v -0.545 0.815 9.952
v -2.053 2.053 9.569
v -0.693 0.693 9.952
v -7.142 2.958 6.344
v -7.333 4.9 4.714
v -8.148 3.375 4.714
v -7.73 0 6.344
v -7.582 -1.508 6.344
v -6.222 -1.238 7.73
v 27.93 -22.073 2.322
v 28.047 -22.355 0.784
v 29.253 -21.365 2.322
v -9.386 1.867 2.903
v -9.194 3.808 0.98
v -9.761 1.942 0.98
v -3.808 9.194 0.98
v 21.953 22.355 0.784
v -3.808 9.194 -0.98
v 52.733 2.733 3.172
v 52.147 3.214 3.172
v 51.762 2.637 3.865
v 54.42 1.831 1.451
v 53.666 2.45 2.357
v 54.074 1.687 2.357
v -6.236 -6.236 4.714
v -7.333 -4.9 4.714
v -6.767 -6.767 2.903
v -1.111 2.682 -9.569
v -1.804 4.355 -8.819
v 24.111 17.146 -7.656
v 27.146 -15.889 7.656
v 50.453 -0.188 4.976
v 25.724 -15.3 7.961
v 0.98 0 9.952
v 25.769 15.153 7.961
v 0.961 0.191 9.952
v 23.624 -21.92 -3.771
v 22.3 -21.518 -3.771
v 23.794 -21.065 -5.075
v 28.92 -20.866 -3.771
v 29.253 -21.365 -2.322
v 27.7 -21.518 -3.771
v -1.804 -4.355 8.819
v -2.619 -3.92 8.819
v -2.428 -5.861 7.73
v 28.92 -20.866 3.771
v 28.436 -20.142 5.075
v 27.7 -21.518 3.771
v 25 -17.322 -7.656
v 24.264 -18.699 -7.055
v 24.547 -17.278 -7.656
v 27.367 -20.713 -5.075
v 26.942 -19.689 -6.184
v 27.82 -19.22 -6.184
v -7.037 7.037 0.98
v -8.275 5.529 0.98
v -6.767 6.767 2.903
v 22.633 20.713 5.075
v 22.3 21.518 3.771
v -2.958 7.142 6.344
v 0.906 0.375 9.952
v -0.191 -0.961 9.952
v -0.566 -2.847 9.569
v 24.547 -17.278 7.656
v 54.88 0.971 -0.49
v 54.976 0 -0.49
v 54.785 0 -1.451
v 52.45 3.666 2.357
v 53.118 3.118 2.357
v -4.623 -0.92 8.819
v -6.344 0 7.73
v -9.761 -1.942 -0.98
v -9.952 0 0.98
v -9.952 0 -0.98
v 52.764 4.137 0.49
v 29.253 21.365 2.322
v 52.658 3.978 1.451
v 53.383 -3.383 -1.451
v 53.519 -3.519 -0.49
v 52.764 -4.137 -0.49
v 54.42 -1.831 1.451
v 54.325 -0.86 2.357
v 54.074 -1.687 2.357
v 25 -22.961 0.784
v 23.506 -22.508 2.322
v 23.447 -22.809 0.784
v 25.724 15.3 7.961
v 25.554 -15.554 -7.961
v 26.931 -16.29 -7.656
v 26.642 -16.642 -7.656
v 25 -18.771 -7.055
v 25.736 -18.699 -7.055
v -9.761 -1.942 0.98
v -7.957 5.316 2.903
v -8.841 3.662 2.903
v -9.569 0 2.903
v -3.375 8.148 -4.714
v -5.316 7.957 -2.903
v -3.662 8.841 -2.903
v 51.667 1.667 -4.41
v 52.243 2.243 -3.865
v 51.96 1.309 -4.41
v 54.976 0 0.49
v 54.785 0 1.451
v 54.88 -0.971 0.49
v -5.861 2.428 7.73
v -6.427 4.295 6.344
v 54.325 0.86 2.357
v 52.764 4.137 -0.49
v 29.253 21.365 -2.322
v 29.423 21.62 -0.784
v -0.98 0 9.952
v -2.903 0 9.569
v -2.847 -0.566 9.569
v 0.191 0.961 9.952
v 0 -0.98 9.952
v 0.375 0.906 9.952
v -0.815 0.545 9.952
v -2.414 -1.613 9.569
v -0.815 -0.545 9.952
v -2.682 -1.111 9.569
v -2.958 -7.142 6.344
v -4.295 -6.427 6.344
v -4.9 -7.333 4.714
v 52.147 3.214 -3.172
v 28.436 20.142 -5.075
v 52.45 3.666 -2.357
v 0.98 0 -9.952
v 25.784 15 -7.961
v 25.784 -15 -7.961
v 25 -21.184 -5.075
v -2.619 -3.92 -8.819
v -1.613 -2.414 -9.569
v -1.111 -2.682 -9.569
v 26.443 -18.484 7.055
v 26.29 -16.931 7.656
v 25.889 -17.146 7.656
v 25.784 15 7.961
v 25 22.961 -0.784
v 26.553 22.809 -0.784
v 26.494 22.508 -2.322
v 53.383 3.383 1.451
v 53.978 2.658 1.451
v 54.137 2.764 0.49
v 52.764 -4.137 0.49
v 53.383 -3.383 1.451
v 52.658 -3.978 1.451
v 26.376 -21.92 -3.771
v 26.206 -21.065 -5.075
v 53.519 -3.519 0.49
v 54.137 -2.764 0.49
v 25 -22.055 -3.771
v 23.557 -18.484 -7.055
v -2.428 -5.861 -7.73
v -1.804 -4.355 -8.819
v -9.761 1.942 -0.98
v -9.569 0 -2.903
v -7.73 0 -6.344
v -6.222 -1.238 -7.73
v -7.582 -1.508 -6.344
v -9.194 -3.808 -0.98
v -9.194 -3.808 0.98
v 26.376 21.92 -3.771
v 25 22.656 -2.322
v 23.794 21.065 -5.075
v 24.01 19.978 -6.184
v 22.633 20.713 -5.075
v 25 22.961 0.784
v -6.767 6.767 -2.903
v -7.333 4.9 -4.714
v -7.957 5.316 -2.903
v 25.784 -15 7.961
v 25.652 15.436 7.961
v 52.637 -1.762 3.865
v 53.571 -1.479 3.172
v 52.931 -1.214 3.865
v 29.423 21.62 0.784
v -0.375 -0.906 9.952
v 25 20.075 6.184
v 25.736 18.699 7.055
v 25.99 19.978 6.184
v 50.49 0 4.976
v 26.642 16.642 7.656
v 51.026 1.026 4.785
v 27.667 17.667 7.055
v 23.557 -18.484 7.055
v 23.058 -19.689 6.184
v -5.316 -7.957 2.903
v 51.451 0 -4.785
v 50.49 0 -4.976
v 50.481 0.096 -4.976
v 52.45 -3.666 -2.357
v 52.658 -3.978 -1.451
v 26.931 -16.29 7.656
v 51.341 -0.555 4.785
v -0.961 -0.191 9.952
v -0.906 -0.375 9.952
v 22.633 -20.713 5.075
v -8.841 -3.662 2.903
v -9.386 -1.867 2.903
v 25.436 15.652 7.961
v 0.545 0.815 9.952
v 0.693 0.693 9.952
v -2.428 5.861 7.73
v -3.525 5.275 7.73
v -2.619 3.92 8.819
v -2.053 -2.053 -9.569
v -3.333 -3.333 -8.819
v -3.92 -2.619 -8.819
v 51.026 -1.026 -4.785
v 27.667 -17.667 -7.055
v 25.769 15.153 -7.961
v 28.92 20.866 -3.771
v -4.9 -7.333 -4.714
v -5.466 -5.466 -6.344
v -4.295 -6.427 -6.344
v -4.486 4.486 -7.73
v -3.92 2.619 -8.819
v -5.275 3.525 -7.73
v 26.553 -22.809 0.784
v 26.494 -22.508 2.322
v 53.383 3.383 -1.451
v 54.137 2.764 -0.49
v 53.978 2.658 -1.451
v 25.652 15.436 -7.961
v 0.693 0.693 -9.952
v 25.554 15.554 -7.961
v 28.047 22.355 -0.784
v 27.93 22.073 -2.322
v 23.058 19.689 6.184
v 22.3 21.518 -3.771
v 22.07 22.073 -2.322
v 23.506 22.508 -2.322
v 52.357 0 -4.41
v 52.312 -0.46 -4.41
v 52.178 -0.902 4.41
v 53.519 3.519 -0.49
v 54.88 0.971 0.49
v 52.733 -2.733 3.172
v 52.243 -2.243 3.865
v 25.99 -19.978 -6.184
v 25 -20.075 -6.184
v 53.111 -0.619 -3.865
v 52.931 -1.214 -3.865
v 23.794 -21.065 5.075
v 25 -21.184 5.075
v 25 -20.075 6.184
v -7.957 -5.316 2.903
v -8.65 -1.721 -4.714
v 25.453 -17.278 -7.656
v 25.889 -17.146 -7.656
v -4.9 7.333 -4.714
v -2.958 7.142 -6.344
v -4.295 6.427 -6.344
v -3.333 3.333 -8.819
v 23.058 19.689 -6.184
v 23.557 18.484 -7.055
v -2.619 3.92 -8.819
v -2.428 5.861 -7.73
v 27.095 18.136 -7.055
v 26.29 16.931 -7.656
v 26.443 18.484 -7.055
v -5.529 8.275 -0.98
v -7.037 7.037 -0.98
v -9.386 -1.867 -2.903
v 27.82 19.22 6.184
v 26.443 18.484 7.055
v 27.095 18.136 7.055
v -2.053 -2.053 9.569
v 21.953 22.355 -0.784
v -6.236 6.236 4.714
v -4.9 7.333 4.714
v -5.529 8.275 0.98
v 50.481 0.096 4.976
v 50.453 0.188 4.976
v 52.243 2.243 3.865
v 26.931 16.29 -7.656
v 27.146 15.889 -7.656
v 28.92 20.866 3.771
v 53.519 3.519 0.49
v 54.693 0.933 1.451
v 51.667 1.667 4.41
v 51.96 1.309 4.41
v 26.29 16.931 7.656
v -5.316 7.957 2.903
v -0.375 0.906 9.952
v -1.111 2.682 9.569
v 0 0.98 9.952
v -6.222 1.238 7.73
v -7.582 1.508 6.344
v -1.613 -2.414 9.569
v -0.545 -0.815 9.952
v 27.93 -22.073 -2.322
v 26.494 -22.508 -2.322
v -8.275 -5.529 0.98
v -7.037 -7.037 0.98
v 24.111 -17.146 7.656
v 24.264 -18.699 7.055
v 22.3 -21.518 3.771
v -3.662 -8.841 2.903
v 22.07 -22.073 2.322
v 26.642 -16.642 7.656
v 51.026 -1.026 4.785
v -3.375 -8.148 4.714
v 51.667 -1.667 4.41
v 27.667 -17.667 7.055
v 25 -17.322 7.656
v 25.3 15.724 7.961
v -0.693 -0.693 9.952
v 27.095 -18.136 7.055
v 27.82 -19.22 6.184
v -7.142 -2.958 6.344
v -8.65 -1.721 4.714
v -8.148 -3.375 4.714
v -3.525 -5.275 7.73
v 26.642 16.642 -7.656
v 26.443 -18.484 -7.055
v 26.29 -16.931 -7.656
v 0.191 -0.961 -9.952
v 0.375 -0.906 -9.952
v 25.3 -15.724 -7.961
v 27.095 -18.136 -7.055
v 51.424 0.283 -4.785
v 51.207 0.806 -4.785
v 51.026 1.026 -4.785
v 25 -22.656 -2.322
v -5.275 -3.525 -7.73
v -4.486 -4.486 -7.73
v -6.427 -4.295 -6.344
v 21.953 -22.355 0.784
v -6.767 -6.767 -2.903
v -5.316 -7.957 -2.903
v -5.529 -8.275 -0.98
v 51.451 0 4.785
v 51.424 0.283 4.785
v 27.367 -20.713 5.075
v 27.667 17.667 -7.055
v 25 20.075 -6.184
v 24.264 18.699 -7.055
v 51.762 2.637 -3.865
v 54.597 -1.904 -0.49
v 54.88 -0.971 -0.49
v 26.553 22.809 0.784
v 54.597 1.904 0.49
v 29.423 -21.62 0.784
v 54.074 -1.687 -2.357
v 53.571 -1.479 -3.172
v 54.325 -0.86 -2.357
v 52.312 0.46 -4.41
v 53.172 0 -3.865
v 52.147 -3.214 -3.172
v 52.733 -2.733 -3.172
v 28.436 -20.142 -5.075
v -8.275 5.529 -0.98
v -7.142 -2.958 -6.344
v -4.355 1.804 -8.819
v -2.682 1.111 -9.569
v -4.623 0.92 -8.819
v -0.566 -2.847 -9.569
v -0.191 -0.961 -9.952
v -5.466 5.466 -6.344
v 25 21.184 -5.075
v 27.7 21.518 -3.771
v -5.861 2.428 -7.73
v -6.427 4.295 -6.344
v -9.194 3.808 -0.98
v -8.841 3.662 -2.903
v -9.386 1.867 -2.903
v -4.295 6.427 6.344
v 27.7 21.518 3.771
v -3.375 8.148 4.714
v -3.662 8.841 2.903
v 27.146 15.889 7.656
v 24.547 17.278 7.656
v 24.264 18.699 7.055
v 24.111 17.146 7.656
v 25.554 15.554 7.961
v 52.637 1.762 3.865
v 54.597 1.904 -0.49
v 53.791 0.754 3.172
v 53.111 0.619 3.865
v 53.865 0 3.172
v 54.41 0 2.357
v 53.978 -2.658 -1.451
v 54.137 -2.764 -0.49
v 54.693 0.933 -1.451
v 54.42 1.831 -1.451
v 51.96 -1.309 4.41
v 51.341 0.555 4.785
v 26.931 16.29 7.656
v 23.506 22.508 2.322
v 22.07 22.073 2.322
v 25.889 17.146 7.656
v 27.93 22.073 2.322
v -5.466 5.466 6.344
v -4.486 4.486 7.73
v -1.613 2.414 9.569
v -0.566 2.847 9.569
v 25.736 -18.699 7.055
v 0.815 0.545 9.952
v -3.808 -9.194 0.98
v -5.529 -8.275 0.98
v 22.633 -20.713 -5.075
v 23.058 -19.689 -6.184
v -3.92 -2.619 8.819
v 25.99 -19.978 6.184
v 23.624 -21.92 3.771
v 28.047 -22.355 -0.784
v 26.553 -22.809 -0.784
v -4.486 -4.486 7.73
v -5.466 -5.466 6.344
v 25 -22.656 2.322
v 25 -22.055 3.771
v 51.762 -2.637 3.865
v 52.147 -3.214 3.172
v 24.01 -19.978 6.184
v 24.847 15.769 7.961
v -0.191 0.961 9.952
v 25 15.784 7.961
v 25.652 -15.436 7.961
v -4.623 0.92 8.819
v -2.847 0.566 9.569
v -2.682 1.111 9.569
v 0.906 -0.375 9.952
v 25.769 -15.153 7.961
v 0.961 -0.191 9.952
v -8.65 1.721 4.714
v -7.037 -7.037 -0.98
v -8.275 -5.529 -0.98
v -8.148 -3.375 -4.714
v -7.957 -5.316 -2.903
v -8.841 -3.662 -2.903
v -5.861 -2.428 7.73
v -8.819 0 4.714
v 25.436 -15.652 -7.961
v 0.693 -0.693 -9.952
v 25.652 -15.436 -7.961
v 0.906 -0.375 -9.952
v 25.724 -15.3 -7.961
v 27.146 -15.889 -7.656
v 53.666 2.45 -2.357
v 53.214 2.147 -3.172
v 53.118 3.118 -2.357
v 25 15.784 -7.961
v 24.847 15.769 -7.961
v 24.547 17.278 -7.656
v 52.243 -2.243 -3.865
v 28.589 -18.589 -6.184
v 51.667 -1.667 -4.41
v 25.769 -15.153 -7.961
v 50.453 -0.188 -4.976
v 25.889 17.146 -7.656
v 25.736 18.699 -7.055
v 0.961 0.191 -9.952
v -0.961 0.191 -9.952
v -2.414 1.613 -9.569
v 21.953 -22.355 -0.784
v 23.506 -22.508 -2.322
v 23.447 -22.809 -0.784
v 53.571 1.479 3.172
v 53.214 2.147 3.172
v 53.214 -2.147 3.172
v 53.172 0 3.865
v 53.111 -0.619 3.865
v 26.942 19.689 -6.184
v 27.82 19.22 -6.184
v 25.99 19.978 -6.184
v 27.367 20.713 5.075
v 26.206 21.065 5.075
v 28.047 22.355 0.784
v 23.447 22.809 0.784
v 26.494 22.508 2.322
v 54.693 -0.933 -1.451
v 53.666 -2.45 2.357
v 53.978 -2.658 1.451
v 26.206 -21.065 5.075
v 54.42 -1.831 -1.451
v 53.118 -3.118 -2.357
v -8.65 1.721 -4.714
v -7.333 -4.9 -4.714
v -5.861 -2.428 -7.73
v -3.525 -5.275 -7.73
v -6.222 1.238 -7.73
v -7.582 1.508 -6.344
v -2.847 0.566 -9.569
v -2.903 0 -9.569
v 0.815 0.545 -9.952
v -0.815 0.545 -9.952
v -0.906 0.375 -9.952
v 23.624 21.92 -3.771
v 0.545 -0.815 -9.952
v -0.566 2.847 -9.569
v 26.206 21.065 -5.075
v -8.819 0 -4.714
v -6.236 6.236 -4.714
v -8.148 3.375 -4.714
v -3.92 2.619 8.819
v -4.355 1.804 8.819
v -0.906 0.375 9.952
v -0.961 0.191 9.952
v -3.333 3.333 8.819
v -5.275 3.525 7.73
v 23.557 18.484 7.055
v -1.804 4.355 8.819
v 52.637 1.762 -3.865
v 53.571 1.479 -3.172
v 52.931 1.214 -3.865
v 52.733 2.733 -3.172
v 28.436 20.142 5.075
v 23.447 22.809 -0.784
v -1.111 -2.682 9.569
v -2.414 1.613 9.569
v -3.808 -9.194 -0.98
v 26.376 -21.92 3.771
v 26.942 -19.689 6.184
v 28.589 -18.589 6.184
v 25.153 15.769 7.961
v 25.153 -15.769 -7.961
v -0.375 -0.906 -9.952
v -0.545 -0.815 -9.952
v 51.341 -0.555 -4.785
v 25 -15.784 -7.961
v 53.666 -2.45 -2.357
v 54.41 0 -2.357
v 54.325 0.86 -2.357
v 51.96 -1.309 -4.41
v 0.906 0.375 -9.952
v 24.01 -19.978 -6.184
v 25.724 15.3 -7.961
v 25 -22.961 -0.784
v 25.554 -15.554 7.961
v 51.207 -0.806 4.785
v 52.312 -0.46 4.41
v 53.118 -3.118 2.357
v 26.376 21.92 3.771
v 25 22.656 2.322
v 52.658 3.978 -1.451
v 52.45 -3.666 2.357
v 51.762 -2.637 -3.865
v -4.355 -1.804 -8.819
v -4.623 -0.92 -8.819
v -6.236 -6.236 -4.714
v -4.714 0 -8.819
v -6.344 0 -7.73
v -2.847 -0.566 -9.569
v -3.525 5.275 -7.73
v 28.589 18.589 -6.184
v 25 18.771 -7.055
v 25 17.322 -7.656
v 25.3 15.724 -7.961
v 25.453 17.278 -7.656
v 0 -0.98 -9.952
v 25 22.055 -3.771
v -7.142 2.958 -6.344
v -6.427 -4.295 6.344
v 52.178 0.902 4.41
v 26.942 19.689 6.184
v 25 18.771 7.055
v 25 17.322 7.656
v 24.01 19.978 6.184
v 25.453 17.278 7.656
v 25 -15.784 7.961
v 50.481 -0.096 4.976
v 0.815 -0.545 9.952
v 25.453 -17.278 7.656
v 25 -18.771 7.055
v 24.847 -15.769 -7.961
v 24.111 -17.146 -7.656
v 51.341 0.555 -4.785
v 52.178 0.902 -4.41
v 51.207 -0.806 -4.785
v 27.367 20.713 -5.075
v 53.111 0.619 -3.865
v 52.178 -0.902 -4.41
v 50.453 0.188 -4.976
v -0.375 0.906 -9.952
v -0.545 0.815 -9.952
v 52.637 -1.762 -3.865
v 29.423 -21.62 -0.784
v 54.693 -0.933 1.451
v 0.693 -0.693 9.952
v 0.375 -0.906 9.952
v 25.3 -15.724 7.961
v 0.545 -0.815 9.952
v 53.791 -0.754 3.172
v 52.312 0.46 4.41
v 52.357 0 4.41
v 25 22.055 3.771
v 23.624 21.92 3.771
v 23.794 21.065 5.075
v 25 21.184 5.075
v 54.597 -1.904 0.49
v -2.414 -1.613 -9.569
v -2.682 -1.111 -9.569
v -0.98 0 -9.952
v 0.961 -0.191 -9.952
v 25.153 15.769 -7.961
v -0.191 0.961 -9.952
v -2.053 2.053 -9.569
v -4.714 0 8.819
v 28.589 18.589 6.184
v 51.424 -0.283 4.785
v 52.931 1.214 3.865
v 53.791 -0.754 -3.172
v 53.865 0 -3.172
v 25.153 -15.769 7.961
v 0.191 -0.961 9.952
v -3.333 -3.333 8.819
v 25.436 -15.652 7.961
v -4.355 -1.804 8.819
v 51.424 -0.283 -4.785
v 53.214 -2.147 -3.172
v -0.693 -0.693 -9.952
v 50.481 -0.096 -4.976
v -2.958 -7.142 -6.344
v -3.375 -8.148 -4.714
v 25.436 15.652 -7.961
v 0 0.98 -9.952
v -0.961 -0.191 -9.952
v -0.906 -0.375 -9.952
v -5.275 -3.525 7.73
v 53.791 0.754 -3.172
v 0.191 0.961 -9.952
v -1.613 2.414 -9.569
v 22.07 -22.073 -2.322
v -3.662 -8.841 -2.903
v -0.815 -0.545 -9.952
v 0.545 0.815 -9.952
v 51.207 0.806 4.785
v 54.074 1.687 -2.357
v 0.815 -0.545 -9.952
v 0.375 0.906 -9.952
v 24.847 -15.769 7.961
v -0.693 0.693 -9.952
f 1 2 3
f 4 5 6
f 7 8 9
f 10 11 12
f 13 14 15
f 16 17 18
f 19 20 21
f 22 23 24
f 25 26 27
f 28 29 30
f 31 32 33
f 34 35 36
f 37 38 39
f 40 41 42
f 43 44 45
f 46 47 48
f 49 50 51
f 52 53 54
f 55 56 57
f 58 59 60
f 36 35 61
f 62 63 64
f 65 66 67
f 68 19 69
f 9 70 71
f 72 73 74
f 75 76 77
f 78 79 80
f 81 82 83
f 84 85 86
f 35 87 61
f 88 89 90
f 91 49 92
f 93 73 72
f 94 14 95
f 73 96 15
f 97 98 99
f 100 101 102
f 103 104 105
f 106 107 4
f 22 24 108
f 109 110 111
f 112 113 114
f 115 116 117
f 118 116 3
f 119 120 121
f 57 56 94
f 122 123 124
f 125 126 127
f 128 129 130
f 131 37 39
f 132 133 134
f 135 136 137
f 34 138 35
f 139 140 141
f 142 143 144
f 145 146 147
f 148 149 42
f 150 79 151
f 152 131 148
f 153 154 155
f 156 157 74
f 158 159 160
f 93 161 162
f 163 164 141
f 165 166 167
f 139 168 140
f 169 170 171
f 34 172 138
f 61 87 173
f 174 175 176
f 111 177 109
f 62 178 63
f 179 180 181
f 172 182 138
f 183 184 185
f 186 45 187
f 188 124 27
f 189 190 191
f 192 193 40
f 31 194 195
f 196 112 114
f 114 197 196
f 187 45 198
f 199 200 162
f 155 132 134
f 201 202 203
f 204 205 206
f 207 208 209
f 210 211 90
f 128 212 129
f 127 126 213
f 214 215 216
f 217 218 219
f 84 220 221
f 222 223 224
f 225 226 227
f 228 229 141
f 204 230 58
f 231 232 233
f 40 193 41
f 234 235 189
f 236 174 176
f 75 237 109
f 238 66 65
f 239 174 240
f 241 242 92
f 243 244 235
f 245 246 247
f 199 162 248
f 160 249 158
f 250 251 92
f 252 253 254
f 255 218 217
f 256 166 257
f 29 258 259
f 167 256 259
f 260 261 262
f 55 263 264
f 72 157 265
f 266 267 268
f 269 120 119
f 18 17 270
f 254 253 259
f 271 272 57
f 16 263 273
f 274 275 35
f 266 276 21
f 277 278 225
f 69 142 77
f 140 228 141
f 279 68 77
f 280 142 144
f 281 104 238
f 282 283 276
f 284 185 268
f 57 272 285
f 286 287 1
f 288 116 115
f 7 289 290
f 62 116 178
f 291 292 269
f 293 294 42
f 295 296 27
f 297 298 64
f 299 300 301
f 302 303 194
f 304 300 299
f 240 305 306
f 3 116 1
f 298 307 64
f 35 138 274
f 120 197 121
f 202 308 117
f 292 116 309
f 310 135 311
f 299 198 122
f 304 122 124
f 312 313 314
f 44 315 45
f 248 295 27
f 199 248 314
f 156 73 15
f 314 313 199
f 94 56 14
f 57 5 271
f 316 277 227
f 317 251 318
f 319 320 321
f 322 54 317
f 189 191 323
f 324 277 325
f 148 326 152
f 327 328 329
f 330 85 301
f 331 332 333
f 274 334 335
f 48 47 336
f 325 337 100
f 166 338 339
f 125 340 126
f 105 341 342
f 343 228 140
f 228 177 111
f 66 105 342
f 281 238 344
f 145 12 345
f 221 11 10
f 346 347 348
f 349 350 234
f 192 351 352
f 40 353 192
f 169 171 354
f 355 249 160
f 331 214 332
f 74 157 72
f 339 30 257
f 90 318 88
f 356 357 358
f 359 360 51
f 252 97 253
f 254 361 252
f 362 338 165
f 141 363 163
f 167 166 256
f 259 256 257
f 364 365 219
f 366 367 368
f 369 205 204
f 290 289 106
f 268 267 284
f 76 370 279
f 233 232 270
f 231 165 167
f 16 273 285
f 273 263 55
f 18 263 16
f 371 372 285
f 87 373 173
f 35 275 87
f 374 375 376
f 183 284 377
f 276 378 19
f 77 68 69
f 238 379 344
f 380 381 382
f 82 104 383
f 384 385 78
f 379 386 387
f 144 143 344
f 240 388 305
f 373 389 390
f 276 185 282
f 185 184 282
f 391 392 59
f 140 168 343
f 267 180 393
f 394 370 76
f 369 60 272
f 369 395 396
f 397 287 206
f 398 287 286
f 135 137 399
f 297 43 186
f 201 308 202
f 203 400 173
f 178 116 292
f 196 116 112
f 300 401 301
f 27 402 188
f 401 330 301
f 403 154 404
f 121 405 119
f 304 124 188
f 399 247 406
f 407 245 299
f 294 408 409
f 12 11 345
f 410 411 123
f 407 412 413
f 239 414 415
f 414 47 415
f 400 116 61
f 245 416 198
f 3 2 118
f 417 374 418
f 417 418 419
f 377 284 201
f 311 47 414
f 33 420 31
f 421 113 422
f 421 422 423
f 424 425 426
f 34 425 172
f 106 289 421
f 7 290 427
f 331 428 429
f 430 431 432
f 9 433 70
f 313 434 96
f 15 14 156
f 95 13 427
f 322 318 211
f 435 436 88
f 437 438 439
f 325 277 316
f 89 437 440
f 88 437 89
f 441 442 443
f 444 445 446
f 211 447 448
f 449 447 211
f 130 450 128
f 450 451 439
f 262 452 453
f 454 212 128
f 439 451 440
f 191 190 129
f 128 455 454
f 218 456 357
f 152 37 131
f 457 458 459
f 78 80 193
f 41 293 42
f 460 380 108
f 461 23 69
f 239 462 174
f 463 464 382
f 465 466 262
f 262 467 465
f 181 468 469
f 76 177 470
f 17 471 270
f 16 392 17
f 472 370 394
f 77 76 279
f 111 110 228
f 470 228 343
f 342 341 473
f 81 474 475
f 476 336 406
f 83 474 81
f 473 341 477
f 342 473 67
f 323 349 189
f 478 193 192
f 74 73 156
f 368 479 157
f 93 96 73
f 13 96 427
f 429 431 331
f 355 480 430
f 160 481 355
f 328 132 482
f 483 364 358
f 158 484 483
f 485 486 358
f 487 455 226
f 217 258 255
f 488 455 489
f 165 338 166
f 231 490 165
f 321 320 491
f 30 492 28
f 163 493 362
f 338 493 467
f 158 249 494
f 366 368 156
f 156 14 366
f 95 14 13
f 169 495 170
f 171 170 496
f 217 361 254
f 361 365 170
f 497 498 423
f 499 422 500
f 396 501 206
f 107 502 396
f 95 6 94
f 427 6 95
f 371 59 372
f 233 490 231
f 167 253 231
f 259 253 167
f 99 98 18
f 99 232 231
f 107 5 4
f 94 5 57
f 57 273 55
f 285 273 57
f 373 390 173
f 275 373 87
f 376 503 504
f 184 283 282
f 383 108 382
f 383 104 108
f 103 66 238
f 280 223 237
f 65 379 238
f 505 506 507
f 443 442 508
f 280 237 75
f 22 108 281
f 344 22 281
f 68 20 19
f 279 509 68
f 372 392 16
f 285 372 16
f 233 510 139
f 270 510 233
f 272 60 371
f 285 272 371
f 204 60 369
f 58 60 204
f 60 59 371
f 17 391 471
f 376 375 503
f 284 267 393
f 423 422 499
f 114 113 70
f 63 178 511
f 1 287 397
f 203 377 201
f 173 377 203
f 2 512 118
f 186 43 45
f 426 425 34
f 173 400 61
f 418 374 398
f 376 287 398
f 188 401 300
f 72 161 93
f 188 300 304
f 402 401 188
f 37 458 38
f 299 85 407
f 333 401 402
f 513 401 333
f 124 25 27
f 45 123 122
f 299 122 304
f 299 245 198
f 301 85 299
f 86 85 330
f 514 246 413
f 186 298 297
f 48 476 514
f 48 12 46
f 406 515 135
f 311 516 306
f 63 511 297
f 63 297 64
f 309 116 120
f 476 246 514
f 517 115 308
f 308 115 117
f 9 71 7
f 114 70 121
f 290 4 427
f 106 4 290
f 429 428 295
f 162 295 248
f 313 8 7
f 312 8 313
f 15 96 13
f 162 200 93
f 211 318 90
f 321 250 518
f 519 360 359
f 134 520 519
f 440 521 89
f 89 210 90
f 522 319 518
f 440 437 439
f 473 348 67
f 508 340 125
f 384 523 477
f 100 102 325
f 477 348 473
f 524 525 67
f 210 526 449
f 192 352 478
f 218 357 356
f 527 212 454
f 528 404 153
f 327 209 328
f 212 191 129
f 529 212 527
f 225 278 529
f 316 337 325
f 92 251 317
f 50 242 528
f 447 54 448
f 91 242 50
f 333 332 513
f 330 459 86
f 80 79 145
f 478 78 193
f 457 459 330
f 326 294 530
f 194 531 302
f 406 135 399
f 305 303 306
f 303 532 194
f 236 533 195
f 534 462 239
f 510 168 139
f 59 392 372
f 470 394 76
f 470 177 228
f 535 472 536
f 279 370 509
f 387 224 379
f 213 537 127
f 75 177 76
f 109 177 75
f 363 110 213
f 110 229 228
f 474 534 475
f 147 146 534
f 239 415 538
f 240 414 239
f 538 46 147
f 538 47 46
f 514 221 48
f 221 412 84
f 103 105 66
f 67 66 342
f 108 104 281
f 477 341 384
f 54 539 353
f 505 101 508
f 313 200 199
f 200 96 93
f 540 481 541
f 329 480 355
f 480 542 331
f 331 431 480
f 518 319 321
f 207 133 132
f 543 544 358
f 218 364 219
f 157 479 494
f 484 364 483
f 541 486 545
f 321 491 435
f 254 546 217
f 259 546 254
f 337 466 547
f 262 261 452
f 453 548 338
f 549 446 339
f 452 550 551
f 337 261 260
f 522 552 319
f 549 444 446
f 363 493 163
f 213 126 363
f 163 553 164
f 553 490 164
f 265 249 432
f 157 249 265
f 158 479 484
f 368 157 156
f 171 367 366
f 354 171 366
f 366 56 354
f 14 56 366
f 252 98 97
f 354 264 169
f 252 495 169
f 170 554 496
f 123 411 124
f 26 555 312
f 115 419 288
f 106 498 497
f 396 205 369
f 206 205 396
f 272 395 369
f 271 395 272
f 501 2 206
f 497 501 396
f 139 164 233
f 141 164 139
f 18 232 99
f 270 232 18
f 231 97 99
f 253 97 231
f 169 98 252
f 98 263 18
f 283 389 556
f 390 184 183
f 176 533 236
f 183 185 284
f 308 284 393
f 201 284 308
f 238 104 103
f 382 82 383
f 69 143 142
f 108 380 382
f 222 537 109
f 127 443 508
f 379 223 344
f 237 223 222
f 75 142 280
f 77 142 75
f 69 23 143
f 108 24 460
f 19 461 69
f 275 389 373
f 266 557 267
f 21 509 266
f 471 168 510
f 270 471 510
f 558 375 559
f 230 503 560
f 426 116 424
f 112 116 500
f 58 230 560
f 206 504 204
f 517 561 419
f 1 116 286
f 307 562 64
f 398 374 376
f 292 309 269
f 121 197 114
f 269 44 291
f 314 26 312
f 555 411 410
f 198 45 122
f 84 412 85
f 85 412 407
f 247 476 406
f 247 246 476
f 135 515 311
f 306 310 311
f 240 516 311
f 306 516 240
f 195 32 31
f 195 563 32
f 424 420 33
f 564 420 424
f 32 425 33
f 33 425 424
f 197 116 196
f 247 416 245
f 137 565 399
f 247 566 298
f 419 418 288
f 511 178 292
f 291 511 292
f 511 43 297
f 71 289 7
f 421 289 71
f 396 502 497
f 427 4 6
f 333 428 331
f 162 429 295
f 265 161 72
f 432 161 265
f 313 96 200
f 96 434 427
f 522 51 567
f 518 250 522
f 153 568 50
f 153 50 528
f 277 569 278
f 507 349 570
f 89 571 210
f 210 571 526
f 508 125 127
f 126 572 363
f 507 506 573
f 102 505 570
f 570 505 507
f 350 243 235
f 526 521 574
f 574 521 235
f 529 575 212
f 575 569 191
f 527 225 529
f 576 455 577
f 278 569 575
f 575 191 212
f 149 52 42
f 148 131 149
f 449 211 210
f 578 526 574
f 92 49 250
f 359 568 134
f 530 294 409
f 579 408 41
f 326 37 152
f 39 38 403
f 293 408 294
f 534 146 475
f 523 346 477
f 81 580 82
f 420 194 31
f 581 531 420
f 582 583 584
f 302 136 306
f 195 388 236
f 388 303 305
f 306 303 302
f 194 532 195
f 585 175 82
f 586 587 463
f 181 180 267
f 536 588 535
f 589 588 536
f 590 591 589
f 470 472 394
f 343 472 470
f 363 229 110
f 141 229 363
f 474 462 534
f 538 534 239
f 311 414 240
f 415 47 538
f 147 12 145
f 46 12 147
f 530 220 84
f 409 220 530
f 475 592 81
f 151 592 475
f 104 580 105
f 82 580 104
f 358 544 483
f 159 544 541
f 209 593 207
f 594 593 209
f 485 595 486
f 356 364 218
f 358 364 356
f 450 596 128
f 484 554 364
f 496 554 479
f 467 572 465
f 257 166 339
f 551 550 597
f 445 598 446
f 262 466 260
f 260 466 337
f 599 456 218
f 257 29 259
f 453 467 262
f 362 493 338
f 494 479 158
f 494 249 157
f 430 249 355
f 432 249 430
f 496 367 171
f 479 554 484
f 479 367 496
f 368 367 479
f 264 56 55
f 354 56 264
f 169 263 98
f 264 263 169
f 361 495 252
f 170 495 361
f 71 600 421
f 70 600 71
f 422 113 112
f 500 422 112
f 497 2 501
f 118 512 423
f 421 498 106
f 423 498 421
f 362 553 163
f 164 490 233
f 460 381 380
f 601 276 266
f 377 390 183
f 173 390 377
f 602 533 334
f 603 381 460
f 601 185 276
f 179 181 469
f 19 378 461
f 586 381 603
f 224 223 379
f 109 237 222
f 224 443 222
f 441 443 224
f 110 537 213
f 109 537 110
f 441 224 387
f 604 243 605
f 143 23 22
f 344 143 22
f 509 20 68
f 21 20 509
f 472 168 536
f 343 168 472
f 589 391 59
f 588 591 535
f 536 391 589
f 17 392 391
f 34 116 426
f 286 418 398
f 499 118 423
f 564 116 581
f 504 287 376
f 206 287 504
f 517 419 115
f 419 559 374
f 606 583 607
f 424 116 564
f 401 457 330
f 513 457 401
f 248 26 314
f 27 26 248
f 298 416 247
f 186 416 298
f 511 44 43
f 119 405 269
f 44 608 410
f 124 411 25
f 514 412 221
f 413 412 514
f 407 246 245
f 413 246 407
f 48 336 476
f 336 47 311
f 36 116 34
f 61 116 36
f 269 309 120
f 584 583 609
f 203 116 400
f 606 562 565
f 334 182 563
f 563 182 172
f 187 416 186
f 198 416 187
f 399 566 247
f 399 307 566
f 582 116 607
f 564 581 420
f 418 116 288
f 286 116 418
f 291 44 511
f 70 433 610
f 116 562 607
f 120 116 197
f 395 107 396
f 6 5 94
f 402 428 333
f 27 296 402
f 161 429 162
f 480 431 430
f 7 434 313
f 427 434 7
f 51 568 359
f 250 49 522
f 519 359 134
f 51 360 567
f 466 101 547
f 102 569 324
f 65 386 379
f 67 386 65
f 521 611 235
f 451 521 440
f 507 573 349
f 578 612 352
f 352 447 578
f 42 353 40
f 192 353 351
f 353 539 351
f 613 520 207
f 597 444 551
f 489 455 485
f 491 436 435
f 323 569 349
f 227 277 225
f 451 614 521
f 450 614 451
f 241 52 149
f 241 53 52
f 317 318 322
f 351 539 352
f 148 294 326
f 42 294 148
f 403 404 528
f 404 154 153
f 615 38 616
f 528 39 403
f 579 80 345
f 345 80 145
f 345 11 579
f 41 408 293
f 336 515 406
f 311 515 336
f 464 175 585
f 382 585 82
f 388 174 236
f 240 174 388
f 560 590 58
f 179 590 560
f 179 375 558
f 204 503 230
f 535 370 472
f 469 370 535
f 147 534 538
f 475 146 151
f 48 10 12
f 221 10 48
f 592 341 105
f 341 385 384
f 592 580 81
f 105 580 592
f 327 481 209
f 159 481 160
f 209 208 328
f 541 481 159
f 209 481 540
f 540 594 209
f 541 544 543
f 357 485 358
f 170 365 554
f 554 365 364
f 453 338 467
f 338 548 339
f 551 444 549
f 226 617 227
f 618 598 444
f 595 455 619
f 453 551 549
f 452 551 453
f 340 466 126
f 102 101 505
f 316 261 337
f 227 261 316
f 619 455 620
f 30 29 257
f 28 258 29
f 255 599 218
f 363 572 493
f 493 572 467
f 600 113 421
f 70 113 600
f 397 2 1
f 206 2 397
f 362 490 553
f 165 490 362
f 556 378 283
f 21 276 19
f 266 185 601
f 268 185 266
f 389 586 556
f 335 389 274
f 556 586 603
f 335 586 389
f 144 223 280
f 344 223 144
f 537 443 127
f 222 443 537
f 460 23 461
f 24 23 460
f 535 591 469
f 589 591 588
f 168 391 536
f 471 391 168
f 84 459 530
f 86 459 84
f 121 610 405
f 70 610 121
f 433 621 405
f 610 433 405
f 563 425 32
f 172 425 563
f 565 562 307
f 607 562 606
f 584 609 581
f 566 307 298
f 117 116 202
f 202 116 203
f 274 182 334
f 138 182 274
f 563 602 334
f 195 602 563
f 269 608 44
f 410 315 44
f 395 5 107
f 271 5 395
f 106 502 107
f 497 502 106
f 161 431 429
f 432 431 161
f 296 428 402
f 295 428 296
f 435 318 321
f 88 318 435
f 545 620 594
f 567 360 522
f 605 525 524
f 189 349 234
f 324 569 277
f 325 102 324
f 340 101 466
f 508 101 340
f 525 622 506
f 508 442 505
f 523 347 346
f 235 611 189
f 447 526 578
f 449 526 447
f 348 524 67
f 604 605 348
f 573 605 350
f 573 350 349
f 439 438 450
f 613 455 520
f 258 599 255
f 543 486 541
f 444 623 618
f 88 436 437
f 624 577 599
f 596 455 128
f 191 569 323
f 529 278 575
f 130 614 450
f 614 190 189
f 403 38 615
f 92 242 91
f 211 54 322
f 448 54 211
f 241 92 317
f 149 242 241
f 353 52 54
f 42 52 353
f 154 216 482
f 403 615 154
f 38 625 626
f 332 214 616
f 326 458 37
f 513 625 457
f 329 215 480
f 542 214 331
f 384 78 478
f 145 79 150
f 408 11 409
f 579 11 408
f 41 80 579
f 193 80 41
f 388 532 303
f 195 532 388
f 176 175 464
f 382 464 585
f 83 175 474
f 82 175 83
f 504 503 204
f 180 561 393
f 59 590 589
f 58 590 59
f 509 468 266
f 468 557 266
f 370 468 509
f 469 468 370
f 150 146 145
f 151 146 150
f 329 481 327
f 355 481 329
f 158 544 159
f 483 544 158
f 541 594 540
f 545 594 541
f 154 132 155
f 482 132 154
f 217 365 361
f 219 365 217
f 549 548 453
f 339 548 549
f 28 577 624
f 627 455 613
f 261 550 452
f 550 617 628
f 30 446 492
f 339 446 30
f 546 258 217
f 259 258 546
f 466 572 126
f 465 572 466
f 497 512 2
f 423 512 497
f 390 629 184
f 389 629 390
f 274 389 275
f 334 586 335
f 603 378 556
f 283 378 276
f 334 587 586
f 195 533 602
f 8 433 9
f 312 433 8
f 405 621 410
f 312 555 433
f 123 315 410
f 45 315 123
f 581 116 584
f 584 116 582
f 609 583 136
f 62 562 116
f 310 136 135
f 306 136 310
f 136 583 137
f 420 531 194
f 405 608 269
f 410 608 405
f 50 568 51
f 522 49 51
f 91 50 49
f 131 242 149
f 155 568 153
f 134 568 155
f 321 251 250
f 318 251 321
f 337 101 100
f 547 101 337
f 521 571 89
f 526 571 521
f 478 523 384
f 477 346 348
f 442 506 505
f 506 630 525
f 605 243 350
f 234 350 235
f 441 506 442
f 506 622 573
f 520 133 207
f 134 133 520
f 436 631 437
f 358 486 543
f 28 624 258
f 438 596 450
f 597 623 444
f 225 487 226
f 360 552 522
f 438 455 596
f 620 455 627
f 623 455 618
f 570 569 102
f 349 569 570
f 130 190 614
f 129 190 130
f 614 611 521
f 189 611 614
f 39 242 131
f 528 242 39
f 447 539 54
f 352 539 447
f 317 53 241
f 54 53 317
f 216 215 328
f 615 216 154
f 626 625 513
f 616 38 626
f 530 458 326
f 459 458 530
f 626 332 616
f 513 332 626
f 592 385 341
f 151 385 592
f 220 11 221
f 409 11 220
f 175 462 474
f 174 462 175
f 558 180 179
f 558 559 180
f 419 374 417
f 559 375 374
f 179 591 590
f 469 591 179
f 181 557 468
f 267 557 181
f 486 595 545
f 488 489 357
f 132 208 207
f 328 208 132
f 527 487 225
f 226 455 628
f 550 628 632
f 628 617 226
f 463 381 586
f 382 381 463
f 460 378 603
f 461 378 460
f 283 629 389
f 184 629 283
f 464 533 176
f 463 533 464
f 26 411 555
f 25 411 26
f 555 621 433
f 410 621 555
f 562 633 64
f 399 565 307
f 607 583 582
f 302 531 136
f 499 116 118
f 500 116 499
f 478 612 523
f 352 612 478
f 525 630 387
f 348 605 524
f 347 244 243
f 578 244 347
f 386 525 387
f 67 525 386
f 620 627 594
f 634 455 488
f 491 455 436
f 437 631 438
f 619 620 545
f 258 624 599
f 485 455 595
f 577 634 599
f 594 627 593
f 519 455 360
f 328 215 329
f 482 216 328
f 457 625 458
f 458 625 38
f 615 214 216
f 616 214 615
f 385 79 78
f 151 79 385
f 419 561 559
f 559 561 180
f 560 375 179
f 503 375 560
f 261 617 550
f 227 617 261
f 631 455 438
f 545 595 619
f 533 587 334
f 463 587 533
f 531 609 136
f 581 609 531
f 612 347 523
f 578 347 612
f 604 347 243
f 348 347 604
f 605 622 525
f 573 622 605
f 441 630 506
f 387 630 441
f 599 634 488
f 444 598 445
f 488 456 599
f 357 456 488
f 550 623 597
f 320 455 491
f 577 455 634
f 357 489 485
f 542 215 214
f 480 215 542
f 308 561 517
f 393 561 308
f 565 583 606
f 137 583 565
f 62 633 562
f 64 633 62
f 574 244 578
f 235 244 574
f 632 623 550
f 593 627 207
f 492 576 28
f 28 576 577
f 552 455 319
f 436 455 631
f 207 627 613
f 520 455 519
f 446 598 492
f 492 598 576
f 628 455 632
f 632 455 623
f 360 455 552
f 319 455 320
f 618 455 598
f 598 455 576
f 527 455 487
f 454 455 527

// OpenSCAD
// GCSC2 Test Fixture: Known-good hull shape
// Simple convex hull that should always pass validation

hull() {
    translate([0, 0, 0]) sphere(r=10, $fn=32);
    translate([50, 0, 0]) sphere(r=5, $fn=32);
    translate([25, 15, 0]) sphere(r=8, $fn=32);
    translate([25, -15, 0]) sphere(r=8, $fn=32);
}
